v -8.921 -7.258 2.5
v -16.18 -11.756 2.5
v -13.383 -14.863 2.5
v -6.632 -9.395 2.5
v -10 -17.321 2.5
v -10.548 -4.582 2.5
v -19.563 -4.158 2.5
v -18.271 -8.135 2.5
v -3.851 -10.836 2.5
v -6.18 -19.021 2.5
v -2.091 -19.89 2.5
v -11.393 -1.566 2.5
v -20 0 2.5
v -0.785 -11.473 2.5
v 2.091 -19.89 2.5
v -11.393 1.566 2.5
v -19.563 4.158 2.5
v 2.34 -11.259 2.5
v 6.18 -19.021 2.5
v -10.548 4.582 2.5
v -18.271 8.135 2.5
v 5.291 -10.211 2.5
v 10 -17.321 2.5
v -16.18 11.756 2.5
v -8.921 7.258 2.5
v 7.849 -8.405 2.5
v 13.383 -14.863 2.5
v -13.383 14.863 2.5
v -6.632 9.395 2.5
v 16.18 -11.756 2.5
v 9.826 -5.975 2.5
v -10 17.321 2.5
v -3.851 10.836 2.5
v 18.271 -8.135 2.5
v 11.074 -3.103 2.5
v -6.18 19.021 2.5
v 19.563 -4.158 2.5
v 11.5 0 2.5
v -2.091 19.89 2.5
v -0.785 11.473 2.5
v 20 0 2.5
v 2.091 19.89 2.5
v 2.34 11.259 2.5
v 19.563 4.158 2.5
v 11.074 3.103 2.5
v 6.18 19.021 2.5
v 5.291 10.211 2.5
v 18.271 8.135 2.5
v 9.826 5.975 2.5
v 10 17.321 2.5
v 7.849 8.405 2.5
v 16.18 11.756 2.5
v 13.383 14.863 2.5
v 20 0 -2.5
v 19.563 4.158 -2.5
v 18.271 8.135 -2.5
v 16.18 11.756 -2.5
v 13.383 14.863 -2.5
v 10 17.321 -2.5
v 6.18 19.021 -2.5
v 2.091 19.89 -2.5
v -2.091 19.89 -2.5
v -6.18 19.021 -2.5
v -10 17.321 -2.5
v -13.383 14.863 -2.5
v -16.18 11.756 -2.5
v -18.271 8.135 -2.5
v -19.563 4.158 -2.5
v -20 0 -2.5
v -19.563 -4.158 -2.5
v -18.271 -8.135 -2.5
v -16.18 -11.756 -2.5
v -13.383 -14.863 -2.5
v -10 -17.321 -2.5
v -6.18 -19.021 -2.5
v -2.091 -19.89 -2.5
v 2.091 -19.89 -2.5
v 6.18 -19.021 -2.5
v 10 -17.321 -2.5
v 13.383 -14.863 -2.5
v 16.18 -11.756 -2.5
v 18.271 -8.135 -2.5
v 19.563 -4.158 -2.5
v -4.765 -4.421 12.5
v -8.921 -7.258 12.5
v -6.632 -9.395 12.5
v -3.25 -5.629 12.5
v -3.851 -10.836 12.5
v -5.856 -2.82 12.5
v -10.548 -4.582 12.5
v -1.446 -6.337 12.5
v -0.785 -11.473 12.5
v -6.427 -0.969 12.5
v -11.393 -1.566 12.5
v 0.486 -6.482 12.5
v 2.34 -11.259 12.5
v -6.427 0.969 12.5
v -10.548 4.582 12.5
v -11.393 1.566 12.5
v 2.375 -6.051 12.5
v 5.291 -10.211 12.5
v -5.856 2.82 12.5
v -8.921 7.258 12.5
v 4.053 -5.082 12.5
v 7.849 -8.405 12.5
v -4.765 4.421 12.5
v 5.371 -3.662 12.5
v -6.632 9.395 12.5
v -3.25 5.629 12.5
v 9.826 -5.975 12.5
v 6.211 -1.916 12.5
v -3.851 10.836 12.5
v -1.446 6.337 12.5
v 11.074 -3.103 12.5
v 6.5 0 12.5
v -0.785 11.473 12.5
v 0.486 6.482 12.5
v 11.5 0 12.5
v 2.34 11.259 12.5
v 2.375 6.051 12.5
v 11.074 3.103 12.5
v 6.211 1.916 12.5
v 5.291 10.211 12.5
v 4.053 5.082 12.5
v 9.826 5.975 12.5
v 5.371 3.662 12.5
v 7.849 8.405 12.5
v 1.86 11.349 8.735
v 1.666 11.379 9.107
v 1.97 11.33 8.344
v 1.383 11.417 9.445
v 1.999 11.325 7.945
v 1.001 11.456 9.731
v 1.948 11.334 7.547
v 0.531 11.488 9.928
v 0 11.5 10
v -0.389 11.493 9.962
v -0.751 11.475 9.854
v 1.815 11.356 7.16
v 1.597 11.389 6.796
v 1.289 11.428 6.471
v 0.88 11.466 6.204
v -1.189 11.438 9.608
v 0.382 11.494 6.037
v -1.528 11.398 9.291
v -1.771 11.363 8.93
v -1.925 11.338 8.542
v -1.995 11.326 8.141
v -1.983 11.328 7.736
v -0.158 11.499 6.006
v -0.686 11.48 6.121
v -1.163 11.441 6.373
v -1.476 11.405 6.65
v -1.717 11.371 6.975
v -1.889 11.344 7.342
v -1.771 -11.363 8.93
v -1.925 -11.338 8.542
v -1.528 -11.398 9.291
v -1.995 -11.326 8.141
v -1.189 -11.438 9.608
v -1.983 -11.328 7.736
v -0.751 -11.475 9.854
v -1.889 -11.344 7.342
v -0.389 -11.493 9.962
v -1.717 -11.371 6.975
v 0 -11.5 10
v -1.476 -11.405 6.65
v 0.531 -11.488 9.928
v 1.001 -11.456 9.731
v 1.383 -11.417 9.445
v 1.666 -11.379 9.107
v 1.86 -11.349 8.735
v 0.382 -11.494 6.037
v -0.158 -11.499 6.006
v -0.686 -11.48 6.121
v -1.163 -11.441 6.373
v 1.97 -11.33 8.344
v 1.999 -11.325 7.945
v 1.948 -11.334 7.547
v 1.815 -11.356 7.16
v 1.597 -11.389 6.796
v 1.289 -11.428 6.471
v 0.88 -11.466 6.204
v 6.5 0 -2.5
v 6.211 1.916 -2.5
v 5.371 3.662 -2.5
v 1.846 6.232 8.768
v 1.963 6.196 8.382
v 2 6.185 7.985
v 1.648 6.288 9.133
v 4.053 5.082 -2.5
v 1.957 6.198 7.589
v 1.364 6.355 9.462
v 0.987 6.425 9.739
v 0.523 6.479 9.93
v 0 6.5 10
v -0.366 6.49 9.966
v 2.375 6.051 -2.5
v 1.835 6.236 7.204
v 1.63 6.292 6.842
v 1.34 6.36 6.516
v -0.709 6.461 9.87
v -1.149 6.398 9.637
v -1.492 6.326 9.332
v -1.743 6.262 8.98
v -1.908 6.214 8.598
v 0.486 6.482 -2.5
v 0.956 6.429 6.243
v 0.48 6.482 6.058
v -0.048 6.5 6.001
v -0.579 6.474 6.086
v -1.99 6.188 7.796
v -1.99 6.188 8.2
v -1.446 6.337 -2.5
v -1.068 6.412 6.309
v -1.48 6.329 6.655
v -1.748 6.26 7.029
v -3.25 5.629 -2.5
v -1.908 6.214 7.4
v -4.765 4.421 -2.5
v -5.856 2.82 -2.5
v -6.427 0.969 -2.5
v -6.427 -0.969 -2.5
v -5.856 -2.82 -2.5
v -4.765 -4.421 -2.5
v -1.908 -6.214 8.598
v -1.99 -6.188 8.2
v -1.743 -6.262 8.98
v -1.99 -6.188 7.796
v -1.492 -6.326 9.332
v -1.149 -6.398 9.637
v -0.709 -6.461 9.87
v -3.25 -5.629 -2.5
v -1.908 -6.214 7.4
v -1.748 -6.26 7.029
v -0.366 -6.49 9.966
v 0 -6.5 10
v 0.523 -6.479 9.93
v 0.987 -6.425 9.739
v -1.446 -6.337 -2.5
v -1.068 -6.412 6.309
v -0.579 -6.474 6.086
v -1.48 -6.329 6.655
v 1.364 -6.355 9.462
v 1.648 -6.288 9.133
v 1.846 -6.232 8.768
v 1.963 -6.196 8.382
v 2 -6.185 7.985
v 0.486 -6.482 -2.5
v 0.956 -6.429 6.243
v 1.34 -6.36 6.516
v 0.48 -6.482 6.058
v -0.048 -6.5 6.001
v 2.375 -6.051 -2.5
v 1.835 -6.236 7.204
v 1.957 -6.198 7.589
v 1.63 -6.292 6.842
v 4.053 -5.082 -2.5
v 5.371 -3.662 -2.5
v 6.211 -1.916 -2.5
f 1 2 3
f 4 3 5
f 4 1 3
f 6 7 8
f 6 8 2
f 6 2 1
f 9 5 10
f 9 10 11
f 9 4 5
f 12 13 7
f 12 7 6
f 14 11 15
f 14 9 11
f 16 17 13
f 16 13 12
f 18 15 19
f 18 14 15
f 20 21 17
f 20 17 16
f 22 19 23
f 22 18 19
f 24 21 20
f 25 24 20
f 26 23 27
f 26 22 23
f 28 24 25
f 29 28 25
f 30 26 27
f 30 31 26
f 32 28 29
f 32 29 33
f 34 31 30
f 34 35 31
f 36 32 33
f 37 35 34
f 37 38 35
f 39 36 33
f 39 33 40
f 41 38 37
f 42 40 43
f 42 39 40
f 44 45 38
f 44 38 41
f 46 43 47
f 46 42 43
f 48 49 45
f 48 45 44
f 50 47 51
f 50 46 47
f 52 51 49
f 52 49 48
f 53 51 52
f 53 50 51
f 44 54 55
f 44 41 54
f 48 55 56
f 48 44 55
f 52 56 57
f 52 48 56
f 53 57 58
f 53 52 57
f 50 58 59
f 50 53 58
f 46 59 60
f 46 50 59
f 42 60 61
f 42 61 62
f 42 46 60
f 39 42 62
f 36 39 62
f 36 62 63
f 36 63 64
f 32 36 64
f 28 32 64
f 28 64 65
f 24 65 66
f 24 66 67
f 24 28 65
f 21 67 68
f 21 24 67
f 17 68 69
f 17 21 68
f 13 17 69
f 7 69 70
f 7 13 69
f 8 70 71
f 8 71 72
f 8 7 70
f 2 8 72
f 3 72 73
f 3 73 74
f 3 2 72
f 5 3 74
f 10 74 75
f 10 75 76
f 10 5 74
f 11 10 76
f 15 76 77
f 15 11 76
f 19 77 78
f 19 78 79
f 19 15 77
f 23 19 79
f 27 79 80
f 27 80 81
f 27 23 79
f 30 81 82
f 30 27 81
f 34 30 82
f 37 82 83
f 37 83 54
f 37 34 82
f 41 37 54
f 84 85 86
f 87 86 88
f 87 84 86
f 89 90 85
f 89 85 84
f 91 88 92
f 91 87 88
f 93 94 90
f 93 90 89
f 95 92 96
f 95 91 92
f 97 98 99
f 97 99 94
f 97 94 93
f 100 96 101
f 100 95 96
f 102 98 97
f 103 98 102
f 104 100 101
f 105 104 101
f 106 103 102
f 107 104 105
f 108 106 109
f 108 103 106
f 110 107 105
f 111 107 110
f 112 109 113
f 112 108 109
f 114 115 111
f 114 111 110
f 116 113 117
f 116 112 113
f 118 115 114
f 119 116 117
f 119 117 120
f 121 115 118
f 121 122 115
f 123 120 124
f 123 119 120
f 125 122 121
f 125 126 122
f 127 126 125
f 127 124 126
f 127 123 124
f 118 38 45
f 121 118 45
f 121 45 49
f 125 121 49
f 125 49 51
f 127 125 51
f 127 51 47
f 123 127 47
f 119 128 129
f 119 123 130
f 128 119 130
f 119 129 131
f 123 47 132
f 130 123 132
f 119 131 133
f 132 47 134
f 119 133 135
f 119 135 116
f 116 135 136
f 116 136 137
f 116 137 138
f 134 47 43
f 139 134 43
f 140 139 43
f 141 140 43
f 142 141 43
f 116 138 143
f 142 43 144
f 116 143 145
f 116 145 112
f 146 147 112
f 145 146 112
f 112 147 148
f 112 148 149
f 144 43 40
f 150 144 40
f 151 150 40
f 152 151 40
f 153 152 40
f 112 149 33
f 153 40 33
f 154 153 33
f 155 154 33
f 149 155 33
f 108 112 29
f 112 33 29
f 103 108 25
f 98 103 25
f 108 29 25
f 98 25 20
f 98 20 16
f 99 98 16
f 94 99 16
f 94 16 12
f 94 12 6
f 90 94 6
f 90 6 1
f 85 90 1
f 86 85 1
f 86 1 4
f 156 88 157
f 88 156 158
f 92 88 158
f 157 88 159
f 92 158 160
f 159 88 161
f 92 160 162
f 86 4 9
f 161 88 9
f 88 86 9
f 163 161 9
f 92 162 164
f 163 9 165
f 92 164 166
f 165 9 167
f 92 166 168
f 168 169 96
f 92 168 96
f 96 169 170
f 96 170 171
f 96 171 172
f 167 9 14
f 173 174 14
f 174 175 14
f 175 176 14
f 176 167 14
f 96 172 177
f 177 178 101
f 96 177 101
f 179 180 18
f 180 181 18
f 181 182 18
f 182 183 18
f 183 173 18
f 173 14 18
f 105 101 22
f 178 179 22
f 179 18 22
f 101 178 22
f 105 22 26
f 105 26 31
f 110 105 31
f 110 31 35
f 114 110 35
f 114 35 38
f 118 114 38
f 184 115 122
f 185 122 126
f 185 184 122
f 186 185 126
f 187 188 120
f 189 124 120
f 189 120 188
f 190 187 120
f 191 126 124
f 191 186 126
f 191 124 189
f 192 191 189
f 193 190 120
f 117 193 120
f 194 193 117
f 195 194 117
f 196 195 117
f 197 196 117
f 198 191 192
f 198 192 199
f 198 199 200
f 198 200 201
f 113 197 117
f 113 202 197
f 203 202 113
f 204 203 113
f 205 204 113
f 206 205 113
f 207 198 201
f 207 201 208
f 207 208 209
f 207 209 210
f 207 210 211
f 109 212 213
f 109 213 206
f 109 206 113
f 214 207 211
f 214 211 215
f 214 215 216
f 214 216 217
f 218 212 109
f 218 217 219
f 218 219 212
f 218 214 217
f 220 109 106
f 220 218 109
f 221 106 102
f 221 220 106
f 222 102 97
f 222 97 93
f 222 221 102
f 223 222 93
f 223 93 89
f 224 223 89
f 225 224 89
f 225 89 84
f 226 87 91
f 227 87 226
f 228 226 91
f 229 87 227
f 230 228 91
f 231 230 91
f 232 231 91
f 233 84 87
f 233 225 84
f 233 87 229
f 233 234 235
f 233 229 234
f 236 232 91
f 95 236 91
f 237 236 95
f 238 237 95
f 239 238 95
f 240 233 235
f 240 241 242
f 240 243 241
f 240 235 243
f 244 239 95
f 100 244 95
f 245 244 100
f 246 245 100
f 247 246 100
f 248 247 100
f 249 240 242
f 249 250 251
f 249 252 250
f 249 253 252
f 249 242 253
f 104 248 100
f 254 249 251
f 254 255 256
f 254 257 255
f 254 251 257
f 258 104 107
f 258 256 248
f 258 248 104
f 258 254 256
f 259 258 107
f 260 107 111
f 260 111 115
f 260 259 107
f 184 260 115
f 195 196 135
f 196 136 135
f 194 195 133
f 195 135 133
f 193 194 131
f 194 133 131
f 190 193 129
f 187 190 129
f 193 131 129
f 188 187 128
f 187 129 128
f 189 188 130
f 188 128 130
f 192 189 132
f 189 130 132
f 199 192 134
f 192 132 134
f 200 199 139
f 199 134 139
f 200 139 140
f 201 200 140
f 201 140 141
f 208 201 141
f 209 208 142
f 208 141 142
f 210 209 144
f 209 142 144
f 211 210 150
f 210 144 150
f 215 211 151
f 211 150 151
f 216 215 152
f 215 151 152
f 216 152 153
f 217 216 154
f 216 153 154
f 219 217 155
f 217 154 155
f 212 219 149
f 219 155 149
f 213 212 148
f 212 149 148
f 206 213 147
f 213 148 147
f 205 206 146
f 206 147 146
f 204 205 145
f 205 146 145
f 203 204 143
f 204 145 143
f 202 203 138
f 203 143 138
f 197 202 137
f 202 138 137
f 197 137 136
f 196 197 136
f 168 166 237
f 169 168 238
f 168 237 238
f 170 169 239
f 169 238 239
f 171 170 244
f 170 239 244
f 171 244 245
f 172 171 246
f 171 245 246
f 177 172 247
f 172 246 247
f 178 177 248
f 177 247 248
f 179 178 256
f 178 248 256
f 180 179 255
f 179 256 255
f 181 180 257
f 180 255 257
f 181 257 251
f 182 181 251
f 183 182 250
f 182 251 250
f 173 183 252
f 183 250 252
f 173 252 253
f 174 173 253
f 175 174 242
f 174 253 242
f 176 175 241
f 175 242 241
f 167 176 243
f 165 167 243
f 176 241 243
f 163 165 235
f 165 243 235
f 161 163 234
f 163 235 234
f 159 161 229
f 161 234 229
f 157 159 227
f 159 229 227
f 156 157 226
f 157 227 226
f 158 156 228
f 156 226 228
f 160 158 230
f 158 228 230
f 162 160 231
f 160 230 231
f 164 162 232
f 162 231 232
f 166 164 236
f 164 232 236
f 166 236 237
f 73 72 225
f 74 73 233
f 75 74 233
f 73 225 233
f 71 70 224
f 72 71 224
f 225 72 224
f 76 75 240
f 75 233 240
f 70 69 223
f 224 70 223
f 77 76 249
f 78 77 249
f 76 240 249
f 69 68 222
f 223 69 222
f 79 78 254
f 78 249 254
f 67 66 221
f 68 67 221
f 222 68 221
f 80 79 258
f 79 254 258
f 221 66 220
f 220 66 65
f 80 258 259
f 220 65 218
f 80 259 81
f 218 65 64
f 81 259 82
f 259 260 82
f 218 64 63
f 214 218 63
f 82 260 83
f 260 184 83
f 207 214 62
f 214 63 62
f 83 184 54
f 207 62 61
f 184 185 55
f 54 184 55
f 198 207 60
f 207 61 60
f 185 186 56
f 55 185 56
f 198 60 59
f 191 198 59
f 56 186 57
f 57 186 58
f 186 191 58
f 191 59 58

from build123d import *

# Parameters (mm, degrees)
CROQUIS1_R              = 20
CROQUIS1_R_2            = 6.5
SALIENTE_EXTRUIR1_DEPTH = 2.5
CROQUIS2_R              = 11.5
CROQUIS2_R_2            = 6.5
SALIENTE_EXTRUIR2_DEPTH = 10
CROQUIS3_R              = 2
CORTAR_EXTRUIR1_DEPTH   = 15


with BuildPart() as part:
    # Croquis1 → Saliente-Extruir1 (new, symmetric)
    with BuildSketch(Plane.XY):
        Circle(CROQUIS1_R)
        Circle(CROQUIS1_R_2, mode=Mode.SUBTRACT)
    extrude(amount=SALIENTE_EXTRUIR1_DEPTH, both=True)

    # Croquis2 → Saliente-Extruir2 (add)
    with BuildSketch(Plane.XY.offset(2.5)):
        Circle(CROQUIS2_R)
        Circle(CROQUIS2_R_2, mode=Mode.SUBTRACT)
    extrude(amount=SALIENTE_EXTRUIR2_DEPTH)

    # Croquis3 → Cortar-Extruir1 (cut, symmetric)
    with BuildSketch(Plane(origin=(0, 0, 0), x_dir=(1, 0, 0), z_dir=(0, 1, 0))):
        with Locations(Location((0, -8, 0), (0, 0, 270))):
            Circle(CROQUIS3_R)
    extrude(amount=CORTAR_EXTRUIR1_DEPTH, both=True, mode=Mode.SUBTRACT)


solid = part.part
